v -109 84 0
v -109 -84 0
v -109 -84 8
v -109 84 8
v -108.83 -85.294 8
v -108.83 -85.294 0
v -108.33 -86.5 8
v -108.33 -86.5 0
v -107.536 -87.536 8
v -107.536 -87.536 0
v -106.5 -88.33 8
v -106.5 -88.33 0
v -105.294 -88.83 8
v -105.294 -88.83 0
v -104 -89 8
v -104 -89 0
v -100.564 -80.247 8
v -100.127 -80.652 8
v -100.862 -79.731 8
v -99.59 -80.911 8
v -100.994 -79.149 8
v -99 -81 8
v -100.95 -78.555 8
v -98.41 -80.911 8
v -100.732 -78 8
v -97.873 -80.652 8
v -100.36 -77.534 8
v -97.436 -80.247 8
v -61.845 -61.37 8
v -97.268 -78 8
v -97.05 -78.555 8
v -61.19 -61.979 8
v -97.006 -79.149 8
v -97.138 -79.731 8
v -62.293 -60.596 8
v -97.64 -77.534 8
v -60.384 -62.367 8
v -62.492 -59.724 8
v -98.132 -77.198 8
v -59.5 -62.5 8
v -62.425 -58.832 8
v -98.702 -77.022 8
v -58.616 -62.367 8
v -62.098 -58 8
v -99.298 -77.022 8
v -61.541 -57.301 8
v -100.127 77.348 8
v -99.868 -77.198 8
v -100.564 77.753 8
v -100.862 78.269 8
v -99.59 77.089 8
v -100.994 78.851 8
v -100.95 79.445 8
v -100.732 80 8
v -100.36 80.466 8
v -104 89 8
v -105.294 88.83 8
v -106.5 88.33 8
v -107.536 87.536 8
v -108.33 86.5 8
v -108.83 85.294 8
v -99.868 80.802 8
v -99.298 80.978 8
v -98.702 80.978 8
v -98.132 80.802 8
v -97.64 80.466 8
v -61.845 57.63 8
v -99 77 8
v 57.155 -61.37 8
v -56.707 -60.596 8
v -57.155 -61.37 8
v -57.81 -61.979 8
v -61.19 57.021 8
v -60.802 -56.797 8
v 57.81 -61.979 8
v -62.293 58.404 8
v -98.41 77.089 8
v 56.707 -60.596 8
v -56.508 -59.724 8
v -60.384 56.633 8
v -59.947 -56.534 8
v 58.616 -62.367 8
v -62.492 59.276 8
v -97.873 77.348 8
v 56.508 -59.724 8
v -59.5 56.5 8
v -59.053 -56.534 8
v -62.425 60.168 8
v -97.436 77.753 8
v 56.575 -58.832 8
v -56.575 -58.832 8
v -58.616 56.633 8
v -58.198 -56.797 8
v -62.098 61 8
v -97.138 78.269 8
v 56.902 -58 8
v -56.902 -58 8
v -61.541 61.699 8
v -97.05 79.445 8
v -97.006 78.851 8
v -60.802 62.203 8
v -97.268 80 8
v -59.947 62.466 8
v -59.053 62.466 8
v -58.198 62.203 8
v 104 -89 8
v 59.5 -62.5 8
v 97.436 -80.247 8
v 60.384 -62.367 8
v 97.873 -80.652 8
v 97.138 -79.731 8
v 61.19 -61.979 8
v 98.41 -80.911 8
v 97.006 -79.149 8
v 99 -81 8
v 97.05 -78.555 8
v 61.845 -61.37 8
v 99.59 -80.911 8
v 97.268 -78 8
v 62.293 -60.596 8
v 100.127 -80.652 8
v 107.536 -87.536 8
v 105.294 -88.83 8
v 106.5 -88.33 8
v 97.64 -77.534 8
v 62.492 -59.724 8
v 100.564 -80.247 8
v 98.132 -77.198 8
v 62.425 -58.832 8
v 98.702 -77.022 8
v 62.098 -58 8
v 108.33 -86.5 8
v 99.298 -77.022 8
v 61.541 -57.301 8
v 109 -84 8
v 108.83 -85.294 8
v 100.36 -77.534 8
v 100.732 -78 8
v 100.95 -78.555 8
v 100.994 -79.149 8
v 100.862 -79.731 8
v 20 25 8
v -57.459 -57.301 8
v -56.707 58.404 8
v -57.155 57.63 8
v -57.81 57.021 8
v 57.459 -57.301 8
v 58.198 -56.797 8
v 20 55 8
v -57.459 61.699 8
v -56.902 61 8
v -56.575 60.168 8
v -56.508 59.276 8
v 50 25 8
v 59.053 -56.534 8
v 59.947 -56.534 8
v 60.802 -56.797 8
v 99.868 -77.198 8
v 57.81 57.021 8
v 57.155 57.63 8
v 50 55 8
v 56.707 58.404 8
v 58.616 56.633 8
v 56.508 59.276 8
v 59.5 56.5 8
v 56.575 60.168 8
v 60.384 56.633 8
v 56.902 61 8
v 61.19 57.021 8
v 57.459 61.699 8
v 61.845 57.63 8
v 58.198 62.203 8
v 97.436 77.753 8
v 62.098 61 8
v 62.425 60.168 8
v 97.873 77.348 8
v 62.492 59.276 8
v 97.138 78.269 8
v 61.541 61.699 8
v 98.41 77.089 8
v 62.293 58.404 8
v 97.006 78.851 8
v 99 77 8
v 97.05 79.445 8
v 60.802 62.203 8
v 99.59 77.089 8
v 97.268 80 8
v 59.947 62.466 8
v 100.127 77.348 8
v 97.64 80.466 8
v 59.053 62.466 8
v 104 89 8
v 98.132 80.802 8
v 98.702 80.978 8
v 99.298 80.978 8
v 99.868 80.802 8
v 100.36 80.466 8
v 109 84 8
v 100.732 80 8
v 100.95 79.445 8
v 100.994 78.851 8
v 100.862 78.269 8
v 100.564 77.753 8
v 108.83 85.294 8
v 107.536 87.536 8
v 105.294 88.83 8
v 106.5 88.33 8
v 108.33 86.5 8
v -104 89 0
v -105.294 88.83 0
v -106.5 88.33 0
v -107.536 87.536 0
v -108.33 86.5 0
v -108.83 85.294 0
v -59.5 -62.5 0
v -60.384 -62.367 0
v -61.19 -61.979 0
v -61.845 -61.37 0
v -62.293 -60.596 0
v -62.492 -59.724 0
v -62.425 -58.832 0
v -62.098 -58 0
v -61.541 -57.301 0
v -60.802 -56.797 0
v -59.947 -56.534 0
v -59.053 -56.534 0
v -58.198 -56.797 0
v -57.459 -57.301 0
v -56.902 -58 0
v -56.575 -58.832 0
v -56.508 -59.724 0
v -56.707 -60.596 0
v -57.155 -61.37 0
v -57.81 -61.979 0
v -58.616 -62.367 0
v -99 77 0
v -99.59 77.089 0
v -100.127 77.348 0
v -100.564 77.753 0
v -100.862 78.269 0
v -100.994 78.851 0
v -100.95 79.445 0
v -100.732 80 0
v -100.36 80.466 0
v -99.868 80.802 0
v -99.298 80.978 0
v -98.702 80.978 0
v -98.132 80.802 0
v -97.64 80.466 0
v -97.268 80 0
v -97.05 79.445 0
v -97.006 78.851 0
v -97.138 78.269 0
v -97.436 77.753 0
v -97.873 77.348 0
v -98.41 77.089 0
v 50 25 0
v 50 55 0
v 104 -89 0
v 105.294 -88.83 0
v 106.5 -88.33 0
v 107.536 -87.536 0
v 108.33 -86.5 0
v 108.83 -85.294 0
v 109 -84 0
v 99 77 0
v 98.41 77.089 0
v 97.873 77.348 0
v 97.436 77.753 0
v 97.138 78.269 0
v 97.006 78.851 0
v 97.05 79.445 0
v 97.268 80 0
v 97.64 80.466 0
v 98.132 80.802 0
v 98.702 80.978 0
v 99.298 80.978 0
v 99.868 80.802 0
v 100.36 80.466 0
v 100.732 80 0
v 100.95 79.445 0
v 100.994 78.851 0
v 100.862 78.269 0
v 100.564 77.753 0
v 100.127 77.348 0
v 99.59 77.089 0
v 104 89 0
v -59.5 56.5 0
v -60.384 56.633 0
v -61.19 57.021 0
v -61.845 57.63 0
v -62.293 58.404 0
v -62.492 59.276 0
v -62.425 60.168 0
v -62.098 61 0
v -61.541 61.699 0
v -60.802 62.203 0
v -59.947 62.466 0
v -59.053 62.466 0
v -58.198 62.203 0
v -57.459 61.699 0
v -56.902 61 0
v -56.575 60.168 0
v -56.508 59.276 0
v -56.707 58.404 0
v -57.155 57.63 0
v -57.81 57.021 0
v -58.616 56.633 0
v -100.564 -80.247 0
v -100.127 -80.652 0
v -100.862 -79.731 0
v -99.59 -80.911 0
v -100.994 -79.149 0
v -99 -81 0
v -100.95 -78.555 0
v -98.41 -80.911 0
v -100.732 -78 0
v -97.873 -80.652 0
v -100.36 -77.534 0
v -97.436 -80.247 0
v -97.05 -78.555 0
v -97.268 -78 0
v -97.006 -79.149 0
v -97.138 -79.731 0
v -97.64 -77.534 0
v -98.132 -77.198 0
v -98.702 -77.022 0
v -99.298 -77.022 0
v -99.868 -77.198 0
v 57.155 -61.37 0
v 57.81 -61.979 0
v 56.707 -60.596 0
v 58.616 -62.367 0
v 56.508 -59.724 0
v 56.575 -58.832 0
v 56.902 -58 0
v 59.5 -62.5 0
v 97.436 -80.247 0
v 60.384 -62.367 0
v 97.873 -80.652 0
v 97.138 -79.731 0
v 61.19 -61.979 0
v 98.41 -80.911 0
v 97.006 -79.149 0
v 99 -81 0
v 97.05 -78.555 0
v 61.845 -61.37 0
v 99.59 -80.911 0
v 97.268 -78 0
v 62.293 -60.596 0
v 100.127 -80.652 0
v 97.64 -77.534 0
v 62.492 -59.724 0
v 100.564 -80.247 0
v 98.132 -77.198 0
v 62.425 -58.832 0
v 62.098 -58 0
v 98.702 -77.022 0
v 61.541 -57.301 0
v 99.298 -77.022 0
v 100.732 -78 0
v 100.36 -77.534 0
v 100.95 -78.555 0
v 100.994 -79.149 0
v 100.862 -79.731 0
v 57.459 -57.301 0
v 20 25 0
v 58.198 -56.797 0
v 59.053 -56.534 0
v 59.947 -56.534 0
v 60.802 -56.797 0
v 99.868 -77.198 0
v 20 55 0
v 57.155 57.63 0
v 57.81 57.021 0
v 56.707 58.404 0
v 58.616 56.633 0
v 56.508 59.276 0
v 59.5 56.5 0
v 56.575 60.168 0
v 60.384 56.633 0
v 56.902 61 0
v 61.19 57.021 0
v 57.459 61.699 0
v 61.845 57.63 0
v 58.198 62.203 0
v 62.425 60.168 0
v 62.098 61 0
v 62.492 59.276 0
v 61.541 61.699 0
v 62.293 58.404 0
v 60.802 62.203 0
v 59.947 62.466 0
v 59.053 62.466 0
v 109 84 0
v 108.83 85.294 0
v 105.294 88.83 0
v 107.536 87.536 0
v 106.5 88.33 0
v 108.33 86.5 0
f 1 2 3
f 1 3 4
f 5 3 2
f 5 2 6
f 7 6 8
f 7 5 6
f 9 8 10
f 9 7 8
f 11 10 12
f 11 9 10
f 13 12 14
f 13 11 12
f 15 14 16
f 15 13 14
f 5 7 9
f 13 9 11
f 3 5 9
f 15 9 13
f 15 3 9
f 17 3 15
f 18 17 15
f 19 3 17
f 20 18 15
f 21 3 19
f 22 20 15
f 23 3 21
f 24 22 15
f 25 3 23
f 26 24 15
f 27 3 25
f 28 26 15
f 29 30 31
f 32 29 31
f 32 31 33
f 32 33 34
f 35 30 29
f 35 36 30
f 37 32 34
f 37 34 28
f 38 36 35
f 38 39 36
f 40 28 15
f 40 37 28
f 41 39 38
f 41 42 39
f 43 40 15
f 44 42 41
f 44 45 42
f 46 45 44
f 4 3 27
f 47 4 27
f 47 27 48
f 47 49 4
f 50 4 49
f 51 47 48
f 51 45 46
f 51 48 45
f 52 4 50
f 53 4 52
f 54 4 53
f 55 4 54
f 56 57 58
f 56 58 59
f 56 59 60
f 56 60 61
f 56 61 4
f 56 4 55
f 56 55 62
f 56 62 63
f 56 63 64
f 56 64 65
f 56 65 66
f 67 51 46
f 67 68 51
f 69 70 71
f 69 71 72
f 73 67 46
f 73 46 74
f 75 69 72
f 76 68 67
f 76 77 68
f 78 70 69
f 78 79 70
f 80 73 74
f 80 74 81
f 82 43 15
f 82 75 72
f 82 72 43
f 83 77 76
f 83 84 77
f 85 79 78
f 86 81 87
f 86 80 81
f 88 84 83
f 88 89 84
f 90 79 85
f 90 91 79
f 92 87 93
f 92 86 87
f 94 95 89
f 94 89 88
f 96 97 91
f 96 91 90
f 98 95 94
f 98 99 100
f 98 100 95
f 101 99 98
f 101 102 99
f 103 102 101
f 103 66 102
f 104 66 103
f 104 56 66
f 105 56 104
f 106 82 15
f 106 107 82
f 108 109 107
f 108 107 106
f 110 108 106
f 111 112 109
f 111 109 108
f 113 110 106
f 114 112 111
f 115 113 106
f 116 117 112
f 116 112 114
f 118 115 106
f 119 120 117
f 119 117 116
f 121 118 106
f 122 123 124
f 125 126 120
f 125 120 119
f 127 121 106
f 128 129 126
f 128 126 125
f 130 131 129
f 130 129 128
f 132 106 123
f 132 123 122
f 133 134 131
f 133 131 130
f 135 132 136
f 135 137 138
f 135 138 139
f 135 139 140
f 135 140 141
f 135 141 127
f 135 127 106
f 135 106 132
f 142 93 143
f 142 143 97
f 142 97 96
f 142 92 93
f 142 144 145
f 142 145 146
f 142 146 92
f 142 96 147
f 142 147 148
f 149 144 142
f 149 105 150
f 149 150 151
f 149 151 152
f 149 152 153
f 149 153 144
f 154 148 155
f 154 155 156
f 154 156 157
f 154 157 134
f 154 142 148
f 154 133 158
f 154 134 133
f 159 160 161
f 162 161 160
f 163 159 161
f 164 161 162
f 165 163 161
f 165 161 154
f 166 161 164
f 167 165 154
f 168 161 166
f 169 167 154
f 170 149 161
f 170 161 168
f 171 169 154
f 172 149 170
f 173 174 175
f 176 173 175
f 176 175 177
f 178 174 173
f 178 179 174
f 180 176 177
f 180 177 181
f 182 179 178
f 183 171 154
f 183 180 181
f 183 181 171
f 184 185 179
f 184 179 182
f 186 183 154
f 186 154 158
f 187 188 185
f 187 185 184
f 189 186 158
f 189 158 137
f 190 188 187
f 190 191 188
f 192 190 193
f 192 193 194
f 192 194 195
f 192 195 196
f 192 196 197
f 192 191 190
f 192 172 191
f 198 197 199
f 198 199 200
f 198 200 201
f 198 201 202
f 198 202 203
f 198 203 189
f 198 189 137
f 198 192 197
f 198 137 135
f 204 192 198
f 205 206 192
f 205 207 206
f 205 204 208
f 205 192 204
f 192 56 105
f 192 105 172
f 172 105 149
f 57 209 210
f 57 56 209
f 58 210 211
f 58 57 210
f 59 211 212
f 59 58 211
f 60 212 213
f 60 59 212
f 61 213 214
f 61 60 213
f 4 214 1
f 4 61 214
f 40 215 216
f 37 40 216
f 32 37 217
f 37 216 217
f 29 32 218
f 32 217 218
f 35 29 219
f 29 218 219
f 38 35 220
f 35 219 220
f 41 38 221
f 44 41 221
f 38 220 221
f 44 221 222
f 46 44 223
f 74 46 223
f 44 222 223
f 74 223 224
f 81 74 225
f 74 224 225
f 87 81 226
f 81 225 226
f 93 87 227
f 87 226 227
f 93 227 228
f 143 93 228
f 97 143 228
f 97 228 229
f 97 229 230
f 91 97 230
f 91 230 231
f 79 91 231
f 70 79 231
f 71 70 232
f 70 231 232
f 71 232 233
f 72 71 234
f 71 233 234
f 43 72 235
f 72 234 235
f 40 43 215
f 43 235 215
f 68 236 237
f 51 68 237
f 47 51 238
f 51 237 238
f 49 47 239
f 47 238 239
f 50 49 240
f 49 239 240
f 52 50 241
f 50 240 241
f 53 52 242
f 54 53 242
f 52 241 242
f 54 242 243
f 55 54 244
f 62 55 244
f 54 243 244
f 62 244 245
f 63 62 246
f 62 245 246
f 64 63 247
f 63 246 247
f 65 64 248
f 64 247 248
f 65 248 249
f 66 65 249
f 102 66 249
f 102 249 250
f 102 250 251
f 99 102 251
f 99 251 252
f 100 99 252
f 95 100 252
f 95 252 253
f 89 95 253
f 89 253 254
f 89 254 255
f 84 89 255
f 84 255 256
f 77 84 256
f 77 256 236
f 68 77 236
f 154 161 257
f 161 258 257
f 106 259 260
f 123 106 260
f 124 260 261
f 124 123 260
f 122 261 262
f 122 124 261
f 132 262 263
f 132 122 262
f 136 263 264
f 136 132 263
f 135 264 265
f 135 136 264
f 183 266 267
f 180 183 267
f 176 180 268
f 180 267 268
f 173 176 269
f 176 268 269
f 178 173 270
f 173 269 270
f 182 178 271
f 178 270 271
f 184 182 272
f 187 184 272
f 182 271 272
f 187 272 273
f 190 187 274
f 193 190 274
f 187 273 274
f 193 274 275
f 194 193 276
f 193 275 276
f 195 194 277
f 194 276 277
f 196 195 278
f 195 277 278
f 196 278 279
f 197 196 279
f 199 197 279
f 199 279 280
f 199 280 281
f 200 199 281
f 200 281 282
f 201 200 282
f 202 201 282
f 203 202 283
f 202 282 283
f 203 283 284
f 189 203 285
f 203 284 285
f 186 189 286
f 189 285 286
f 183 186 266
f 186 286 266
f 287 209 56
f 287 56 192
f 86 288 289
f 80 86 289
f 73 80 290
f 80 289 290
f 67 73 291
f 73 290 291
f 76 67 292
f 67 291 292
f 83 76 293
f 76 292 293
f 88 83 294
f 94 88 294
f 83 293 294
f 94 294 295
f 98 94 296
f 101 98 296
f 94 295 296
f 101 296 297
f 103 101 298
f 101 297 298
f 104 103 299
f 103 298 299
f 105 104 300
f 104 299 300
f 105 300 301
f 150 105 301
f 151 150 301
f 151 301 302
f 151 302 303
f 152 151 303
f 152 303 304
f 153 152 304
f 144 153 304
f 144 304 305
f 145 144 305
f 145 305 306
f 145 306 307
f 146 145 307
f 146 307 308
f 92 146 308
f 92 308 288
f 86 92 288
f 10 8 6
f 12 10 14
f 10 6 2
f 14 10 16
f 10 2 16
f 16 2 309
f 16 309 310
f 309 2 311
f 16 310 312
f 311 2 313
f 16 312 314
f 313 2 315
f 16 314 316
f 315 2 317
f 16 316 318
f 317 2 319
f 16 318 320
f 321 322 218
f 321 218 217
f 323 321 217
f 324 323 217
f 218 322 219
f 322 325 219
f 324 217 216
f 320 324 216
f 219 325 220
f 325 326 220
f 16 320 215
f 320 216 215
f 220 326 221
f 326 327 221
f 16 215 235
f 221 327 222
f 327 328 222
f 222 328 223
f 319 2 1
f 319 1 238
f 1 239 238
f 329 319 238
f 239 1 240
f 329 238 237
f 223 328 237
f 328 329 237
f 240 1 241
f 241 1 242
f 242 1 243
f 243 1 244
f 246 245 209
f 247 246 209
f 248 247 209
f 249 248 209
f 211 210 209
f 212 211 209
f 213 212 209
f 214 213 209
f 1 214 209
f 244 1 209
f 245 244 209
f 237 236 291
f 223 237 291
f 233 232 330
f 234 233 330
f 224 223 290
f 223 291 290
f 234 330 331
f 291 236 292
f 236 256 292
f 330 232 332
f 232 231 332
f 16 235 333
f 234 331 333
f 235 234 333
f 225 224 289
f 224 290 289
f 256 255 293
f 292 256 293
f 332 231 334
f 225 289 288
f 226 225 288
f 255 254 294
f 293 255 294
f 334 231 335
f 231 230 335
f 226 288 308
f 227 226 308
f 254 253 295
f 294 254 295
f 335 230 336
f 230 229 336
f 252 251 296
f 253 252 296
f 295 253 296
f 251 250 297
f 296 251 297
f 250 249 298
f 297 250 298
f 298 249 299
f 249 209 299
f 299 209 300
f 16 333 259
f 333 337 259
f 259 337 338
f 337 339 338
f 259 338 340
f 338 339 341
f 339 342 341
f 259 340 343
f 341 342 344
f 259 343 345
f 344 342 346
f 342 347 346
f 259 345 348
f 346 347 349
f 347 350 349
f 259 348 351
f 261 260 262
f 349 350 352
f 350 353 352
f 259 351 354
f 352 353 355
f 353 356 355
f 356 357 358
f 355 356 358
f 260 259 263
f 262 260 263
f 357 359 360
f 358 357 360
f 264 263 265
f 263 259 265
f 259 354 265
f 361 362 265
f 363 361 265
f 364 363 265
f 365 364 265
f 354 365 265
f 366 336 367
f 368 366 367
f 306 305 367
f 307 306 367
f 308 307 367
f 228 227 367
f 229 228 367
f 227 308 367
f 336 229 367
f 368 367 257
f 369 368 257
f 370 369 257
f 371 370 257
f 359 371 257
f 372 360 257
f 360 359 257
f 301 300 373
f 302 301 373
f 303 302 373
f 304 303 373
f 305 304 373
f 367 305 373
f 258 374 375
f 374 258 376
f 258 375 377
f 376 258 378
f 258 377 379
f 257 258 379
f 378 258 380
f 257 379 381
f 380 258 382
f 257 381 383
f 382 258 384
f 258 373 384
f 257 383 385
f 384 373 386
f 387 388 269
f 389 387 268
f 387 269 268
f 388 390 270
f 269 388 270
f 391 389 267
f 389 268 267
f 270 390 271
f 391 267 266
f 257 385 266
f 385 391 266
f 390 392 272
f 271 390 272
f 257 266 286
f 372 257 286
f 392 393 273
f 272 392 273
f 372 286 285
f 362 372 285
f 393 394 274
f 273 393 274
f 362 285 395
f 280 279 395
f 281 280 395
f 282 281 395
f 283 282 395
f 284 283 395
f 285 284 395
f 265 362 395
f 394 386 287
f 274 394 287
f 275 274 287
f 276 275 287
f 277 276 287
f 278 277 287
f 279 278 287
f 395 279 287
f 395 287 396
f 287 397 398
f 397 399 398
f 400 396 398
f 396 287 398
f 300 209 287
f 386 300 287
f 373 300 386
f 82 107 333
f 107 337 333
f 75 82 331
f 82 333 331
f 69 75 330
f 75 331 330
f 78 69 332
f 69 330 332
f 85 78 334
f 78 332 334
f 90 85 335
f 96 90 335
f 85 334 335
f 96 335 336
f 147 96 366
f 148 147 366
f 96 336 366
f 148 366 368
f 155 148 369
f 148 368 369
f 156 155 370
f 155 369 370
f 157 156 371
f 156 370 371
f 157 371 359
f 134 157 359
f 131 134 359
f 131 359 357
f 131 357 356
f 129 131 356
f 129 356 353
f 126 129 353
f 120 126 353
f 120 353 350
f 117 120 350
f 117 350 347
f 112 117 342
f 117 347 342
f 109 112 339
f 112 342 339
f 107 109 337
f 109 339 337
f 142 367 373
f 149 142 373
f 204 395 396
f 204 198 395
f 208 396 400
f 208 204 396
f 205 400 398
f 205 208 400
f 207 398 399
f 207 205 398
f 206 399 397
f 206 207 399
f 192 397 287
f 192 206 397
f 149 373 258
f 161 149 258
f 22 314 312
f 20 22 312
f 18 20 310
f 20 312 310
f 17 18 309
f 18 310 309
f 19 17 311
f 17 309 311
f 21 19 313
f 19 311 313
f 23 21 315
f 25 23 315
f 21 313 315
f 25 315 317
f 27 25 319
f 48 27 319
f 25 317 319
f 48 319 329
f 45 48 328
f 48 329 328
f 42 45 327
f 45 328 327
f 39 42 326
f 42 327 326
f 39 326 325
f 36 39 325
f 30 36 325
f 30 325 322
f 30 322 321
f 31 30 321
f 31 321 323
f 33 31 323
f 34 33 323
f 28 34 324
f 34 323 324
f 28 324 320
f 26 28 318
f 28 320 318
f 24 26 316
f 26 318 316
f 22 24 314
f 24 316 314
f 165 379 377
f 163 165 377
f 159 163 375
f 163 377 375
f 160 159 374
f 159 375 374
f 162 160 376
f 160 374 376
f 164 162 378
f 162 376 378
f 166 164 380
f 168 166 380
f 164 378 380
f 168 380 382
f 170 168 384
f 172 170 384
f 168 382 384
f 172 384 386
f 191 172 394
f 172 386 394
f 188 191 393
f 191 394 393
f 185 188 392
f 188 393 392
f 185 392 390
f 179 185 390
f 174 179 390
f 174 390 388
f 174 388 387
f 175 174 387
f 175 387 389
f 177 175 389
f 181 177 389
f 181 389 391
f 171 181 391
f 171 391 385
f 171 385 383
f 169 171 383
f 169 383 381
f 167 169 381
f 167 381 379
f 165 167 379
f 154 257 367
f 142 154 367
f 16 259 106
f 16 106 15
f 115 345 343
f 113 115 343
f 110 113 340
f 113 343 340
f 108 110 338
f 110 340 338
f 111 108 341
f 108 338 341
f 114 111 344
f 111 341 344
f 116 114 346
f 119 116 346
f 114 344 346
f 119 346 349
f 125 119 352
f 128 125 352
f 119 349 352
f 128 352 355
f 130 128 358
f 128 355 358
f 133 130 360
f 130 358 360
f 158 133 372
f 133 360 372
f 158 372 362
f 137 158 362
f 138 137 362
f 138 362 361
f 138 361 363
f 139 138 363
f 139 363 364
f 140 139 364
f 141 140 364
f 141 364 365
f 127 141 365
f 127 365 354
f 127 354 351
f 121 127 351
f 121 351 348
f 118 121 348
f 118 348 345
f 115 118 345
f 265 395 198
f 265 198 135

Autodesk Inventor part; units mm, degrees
ref_plane "YZ Plane" through (0, 0, 0) normal (1, 0, 0) x (0, 1, 0)
ref_plane "XZ Plane" through (0, 0, 0) normal (0, 1, 0) x (-1, 0, 0)
ref_plane "XY Plane" through (0, 0, 0) normal (0, 0, 1) x (1, 0, 0)
sketch "Sketch1" plane through (0, 0, 0) normal (0, 0, 1) x (1, 0, 0)
  line L0 (-109, 89) -> (109, 89)
  line L1 (109, 89) -> (109, -89)
  line L2 (109, -89) -> (-109, -89)
  line L3 (-109, -89) -> (-109, 89)
  line L4 (20, 55) -> (50, 55)
  line L5 (50, 55) -> (50, 25)
  line L6 (50, 25) -> (20, 25)
  line L7 (20, 25) -> (20, 55)
  point P0 (0, 0)
  dimension "d0" = 218
  dimension "d1" = 178
  dimension "d2" = 109
  dimension "d3" = 89
  dimension "d4" = 20
  dimension "d5" = 25
  dimension "d6" = 30
  dimension "d7" = 30
extrude "Extrusion1" add sketch "Sketch1" along normal blind 8
fillet "Fillet1" radius 5 4 edges at (-109, -89, 4) (109, -89, 4) (109, 89, 4) (-109, 89, 4)
sketch "Sketch2" plane through (0, 0, 8) normal (0, 0, 1) x (1, 0, 0)
  line L0 (-99, 79) -> (99, 79)
  line L1 (99, 79) -> (99, -79)
  line L2 (99, -79) -> (-99, -79)
  line L3 (-99, -79) -> (-99, 79)
  line L4 (109, -84) -> (109, 84)
  line L5 (104, 89) -> (-104, 89)
  line L6 (-109, 84) -> (-109, -84)
  line L7 (-104, -89) -> (104, -89)
  circle A0 centre (-99, 79) radius 2
  point P0 (0, 0)
  dimension "d11" = 10
  dimension "d12" = 10
  dimension "d13" = 10
  dimension "d14" = 10
  dimension "d15" = 4
hole "Hole1" at (-99, 79, 8) at (99, 79, 8) at (99, -79, 8) at (-99, -79, 8) direction (0, 0, -1) diameter 4 end through all
sketch "Sketch3" plane through (0, 0, 8) normal (0, 0, 1) x (1, 0, 0)
  line L0 (-59.5, 59.5) -> (59.5, 59.5)
  line L1 (59.5, 59.5) -> (59.5, -59.5)
  line L2 (59.5, -59.5) -> (-59.5, -59.5)
  line L3 (-59.5, -59.5) -> (-59.5, 59.5)
  circle A0 centre (-59.5, 59.5) radius 3
  point P0 (0, 0)
  dimension "d23" = 119
  dimension "d24" = 119
  dimension "d25" = 59.5
  dimension "d26" = 59.5
  dimension "d27" = 6
hole "Hole2" at (-59.5, 59.5, 8) at (59.5, 59.5, 8) at (59.5, -59.5, 8) at (-59.5, -59.5, 8) direction (0, 0, -1) diameter 6 end through all
equation "\"d16\" = d15"
equation "\"d28\" = d27"
properties part number "WaagePlexiUnterseite" material "PET Plastic"
